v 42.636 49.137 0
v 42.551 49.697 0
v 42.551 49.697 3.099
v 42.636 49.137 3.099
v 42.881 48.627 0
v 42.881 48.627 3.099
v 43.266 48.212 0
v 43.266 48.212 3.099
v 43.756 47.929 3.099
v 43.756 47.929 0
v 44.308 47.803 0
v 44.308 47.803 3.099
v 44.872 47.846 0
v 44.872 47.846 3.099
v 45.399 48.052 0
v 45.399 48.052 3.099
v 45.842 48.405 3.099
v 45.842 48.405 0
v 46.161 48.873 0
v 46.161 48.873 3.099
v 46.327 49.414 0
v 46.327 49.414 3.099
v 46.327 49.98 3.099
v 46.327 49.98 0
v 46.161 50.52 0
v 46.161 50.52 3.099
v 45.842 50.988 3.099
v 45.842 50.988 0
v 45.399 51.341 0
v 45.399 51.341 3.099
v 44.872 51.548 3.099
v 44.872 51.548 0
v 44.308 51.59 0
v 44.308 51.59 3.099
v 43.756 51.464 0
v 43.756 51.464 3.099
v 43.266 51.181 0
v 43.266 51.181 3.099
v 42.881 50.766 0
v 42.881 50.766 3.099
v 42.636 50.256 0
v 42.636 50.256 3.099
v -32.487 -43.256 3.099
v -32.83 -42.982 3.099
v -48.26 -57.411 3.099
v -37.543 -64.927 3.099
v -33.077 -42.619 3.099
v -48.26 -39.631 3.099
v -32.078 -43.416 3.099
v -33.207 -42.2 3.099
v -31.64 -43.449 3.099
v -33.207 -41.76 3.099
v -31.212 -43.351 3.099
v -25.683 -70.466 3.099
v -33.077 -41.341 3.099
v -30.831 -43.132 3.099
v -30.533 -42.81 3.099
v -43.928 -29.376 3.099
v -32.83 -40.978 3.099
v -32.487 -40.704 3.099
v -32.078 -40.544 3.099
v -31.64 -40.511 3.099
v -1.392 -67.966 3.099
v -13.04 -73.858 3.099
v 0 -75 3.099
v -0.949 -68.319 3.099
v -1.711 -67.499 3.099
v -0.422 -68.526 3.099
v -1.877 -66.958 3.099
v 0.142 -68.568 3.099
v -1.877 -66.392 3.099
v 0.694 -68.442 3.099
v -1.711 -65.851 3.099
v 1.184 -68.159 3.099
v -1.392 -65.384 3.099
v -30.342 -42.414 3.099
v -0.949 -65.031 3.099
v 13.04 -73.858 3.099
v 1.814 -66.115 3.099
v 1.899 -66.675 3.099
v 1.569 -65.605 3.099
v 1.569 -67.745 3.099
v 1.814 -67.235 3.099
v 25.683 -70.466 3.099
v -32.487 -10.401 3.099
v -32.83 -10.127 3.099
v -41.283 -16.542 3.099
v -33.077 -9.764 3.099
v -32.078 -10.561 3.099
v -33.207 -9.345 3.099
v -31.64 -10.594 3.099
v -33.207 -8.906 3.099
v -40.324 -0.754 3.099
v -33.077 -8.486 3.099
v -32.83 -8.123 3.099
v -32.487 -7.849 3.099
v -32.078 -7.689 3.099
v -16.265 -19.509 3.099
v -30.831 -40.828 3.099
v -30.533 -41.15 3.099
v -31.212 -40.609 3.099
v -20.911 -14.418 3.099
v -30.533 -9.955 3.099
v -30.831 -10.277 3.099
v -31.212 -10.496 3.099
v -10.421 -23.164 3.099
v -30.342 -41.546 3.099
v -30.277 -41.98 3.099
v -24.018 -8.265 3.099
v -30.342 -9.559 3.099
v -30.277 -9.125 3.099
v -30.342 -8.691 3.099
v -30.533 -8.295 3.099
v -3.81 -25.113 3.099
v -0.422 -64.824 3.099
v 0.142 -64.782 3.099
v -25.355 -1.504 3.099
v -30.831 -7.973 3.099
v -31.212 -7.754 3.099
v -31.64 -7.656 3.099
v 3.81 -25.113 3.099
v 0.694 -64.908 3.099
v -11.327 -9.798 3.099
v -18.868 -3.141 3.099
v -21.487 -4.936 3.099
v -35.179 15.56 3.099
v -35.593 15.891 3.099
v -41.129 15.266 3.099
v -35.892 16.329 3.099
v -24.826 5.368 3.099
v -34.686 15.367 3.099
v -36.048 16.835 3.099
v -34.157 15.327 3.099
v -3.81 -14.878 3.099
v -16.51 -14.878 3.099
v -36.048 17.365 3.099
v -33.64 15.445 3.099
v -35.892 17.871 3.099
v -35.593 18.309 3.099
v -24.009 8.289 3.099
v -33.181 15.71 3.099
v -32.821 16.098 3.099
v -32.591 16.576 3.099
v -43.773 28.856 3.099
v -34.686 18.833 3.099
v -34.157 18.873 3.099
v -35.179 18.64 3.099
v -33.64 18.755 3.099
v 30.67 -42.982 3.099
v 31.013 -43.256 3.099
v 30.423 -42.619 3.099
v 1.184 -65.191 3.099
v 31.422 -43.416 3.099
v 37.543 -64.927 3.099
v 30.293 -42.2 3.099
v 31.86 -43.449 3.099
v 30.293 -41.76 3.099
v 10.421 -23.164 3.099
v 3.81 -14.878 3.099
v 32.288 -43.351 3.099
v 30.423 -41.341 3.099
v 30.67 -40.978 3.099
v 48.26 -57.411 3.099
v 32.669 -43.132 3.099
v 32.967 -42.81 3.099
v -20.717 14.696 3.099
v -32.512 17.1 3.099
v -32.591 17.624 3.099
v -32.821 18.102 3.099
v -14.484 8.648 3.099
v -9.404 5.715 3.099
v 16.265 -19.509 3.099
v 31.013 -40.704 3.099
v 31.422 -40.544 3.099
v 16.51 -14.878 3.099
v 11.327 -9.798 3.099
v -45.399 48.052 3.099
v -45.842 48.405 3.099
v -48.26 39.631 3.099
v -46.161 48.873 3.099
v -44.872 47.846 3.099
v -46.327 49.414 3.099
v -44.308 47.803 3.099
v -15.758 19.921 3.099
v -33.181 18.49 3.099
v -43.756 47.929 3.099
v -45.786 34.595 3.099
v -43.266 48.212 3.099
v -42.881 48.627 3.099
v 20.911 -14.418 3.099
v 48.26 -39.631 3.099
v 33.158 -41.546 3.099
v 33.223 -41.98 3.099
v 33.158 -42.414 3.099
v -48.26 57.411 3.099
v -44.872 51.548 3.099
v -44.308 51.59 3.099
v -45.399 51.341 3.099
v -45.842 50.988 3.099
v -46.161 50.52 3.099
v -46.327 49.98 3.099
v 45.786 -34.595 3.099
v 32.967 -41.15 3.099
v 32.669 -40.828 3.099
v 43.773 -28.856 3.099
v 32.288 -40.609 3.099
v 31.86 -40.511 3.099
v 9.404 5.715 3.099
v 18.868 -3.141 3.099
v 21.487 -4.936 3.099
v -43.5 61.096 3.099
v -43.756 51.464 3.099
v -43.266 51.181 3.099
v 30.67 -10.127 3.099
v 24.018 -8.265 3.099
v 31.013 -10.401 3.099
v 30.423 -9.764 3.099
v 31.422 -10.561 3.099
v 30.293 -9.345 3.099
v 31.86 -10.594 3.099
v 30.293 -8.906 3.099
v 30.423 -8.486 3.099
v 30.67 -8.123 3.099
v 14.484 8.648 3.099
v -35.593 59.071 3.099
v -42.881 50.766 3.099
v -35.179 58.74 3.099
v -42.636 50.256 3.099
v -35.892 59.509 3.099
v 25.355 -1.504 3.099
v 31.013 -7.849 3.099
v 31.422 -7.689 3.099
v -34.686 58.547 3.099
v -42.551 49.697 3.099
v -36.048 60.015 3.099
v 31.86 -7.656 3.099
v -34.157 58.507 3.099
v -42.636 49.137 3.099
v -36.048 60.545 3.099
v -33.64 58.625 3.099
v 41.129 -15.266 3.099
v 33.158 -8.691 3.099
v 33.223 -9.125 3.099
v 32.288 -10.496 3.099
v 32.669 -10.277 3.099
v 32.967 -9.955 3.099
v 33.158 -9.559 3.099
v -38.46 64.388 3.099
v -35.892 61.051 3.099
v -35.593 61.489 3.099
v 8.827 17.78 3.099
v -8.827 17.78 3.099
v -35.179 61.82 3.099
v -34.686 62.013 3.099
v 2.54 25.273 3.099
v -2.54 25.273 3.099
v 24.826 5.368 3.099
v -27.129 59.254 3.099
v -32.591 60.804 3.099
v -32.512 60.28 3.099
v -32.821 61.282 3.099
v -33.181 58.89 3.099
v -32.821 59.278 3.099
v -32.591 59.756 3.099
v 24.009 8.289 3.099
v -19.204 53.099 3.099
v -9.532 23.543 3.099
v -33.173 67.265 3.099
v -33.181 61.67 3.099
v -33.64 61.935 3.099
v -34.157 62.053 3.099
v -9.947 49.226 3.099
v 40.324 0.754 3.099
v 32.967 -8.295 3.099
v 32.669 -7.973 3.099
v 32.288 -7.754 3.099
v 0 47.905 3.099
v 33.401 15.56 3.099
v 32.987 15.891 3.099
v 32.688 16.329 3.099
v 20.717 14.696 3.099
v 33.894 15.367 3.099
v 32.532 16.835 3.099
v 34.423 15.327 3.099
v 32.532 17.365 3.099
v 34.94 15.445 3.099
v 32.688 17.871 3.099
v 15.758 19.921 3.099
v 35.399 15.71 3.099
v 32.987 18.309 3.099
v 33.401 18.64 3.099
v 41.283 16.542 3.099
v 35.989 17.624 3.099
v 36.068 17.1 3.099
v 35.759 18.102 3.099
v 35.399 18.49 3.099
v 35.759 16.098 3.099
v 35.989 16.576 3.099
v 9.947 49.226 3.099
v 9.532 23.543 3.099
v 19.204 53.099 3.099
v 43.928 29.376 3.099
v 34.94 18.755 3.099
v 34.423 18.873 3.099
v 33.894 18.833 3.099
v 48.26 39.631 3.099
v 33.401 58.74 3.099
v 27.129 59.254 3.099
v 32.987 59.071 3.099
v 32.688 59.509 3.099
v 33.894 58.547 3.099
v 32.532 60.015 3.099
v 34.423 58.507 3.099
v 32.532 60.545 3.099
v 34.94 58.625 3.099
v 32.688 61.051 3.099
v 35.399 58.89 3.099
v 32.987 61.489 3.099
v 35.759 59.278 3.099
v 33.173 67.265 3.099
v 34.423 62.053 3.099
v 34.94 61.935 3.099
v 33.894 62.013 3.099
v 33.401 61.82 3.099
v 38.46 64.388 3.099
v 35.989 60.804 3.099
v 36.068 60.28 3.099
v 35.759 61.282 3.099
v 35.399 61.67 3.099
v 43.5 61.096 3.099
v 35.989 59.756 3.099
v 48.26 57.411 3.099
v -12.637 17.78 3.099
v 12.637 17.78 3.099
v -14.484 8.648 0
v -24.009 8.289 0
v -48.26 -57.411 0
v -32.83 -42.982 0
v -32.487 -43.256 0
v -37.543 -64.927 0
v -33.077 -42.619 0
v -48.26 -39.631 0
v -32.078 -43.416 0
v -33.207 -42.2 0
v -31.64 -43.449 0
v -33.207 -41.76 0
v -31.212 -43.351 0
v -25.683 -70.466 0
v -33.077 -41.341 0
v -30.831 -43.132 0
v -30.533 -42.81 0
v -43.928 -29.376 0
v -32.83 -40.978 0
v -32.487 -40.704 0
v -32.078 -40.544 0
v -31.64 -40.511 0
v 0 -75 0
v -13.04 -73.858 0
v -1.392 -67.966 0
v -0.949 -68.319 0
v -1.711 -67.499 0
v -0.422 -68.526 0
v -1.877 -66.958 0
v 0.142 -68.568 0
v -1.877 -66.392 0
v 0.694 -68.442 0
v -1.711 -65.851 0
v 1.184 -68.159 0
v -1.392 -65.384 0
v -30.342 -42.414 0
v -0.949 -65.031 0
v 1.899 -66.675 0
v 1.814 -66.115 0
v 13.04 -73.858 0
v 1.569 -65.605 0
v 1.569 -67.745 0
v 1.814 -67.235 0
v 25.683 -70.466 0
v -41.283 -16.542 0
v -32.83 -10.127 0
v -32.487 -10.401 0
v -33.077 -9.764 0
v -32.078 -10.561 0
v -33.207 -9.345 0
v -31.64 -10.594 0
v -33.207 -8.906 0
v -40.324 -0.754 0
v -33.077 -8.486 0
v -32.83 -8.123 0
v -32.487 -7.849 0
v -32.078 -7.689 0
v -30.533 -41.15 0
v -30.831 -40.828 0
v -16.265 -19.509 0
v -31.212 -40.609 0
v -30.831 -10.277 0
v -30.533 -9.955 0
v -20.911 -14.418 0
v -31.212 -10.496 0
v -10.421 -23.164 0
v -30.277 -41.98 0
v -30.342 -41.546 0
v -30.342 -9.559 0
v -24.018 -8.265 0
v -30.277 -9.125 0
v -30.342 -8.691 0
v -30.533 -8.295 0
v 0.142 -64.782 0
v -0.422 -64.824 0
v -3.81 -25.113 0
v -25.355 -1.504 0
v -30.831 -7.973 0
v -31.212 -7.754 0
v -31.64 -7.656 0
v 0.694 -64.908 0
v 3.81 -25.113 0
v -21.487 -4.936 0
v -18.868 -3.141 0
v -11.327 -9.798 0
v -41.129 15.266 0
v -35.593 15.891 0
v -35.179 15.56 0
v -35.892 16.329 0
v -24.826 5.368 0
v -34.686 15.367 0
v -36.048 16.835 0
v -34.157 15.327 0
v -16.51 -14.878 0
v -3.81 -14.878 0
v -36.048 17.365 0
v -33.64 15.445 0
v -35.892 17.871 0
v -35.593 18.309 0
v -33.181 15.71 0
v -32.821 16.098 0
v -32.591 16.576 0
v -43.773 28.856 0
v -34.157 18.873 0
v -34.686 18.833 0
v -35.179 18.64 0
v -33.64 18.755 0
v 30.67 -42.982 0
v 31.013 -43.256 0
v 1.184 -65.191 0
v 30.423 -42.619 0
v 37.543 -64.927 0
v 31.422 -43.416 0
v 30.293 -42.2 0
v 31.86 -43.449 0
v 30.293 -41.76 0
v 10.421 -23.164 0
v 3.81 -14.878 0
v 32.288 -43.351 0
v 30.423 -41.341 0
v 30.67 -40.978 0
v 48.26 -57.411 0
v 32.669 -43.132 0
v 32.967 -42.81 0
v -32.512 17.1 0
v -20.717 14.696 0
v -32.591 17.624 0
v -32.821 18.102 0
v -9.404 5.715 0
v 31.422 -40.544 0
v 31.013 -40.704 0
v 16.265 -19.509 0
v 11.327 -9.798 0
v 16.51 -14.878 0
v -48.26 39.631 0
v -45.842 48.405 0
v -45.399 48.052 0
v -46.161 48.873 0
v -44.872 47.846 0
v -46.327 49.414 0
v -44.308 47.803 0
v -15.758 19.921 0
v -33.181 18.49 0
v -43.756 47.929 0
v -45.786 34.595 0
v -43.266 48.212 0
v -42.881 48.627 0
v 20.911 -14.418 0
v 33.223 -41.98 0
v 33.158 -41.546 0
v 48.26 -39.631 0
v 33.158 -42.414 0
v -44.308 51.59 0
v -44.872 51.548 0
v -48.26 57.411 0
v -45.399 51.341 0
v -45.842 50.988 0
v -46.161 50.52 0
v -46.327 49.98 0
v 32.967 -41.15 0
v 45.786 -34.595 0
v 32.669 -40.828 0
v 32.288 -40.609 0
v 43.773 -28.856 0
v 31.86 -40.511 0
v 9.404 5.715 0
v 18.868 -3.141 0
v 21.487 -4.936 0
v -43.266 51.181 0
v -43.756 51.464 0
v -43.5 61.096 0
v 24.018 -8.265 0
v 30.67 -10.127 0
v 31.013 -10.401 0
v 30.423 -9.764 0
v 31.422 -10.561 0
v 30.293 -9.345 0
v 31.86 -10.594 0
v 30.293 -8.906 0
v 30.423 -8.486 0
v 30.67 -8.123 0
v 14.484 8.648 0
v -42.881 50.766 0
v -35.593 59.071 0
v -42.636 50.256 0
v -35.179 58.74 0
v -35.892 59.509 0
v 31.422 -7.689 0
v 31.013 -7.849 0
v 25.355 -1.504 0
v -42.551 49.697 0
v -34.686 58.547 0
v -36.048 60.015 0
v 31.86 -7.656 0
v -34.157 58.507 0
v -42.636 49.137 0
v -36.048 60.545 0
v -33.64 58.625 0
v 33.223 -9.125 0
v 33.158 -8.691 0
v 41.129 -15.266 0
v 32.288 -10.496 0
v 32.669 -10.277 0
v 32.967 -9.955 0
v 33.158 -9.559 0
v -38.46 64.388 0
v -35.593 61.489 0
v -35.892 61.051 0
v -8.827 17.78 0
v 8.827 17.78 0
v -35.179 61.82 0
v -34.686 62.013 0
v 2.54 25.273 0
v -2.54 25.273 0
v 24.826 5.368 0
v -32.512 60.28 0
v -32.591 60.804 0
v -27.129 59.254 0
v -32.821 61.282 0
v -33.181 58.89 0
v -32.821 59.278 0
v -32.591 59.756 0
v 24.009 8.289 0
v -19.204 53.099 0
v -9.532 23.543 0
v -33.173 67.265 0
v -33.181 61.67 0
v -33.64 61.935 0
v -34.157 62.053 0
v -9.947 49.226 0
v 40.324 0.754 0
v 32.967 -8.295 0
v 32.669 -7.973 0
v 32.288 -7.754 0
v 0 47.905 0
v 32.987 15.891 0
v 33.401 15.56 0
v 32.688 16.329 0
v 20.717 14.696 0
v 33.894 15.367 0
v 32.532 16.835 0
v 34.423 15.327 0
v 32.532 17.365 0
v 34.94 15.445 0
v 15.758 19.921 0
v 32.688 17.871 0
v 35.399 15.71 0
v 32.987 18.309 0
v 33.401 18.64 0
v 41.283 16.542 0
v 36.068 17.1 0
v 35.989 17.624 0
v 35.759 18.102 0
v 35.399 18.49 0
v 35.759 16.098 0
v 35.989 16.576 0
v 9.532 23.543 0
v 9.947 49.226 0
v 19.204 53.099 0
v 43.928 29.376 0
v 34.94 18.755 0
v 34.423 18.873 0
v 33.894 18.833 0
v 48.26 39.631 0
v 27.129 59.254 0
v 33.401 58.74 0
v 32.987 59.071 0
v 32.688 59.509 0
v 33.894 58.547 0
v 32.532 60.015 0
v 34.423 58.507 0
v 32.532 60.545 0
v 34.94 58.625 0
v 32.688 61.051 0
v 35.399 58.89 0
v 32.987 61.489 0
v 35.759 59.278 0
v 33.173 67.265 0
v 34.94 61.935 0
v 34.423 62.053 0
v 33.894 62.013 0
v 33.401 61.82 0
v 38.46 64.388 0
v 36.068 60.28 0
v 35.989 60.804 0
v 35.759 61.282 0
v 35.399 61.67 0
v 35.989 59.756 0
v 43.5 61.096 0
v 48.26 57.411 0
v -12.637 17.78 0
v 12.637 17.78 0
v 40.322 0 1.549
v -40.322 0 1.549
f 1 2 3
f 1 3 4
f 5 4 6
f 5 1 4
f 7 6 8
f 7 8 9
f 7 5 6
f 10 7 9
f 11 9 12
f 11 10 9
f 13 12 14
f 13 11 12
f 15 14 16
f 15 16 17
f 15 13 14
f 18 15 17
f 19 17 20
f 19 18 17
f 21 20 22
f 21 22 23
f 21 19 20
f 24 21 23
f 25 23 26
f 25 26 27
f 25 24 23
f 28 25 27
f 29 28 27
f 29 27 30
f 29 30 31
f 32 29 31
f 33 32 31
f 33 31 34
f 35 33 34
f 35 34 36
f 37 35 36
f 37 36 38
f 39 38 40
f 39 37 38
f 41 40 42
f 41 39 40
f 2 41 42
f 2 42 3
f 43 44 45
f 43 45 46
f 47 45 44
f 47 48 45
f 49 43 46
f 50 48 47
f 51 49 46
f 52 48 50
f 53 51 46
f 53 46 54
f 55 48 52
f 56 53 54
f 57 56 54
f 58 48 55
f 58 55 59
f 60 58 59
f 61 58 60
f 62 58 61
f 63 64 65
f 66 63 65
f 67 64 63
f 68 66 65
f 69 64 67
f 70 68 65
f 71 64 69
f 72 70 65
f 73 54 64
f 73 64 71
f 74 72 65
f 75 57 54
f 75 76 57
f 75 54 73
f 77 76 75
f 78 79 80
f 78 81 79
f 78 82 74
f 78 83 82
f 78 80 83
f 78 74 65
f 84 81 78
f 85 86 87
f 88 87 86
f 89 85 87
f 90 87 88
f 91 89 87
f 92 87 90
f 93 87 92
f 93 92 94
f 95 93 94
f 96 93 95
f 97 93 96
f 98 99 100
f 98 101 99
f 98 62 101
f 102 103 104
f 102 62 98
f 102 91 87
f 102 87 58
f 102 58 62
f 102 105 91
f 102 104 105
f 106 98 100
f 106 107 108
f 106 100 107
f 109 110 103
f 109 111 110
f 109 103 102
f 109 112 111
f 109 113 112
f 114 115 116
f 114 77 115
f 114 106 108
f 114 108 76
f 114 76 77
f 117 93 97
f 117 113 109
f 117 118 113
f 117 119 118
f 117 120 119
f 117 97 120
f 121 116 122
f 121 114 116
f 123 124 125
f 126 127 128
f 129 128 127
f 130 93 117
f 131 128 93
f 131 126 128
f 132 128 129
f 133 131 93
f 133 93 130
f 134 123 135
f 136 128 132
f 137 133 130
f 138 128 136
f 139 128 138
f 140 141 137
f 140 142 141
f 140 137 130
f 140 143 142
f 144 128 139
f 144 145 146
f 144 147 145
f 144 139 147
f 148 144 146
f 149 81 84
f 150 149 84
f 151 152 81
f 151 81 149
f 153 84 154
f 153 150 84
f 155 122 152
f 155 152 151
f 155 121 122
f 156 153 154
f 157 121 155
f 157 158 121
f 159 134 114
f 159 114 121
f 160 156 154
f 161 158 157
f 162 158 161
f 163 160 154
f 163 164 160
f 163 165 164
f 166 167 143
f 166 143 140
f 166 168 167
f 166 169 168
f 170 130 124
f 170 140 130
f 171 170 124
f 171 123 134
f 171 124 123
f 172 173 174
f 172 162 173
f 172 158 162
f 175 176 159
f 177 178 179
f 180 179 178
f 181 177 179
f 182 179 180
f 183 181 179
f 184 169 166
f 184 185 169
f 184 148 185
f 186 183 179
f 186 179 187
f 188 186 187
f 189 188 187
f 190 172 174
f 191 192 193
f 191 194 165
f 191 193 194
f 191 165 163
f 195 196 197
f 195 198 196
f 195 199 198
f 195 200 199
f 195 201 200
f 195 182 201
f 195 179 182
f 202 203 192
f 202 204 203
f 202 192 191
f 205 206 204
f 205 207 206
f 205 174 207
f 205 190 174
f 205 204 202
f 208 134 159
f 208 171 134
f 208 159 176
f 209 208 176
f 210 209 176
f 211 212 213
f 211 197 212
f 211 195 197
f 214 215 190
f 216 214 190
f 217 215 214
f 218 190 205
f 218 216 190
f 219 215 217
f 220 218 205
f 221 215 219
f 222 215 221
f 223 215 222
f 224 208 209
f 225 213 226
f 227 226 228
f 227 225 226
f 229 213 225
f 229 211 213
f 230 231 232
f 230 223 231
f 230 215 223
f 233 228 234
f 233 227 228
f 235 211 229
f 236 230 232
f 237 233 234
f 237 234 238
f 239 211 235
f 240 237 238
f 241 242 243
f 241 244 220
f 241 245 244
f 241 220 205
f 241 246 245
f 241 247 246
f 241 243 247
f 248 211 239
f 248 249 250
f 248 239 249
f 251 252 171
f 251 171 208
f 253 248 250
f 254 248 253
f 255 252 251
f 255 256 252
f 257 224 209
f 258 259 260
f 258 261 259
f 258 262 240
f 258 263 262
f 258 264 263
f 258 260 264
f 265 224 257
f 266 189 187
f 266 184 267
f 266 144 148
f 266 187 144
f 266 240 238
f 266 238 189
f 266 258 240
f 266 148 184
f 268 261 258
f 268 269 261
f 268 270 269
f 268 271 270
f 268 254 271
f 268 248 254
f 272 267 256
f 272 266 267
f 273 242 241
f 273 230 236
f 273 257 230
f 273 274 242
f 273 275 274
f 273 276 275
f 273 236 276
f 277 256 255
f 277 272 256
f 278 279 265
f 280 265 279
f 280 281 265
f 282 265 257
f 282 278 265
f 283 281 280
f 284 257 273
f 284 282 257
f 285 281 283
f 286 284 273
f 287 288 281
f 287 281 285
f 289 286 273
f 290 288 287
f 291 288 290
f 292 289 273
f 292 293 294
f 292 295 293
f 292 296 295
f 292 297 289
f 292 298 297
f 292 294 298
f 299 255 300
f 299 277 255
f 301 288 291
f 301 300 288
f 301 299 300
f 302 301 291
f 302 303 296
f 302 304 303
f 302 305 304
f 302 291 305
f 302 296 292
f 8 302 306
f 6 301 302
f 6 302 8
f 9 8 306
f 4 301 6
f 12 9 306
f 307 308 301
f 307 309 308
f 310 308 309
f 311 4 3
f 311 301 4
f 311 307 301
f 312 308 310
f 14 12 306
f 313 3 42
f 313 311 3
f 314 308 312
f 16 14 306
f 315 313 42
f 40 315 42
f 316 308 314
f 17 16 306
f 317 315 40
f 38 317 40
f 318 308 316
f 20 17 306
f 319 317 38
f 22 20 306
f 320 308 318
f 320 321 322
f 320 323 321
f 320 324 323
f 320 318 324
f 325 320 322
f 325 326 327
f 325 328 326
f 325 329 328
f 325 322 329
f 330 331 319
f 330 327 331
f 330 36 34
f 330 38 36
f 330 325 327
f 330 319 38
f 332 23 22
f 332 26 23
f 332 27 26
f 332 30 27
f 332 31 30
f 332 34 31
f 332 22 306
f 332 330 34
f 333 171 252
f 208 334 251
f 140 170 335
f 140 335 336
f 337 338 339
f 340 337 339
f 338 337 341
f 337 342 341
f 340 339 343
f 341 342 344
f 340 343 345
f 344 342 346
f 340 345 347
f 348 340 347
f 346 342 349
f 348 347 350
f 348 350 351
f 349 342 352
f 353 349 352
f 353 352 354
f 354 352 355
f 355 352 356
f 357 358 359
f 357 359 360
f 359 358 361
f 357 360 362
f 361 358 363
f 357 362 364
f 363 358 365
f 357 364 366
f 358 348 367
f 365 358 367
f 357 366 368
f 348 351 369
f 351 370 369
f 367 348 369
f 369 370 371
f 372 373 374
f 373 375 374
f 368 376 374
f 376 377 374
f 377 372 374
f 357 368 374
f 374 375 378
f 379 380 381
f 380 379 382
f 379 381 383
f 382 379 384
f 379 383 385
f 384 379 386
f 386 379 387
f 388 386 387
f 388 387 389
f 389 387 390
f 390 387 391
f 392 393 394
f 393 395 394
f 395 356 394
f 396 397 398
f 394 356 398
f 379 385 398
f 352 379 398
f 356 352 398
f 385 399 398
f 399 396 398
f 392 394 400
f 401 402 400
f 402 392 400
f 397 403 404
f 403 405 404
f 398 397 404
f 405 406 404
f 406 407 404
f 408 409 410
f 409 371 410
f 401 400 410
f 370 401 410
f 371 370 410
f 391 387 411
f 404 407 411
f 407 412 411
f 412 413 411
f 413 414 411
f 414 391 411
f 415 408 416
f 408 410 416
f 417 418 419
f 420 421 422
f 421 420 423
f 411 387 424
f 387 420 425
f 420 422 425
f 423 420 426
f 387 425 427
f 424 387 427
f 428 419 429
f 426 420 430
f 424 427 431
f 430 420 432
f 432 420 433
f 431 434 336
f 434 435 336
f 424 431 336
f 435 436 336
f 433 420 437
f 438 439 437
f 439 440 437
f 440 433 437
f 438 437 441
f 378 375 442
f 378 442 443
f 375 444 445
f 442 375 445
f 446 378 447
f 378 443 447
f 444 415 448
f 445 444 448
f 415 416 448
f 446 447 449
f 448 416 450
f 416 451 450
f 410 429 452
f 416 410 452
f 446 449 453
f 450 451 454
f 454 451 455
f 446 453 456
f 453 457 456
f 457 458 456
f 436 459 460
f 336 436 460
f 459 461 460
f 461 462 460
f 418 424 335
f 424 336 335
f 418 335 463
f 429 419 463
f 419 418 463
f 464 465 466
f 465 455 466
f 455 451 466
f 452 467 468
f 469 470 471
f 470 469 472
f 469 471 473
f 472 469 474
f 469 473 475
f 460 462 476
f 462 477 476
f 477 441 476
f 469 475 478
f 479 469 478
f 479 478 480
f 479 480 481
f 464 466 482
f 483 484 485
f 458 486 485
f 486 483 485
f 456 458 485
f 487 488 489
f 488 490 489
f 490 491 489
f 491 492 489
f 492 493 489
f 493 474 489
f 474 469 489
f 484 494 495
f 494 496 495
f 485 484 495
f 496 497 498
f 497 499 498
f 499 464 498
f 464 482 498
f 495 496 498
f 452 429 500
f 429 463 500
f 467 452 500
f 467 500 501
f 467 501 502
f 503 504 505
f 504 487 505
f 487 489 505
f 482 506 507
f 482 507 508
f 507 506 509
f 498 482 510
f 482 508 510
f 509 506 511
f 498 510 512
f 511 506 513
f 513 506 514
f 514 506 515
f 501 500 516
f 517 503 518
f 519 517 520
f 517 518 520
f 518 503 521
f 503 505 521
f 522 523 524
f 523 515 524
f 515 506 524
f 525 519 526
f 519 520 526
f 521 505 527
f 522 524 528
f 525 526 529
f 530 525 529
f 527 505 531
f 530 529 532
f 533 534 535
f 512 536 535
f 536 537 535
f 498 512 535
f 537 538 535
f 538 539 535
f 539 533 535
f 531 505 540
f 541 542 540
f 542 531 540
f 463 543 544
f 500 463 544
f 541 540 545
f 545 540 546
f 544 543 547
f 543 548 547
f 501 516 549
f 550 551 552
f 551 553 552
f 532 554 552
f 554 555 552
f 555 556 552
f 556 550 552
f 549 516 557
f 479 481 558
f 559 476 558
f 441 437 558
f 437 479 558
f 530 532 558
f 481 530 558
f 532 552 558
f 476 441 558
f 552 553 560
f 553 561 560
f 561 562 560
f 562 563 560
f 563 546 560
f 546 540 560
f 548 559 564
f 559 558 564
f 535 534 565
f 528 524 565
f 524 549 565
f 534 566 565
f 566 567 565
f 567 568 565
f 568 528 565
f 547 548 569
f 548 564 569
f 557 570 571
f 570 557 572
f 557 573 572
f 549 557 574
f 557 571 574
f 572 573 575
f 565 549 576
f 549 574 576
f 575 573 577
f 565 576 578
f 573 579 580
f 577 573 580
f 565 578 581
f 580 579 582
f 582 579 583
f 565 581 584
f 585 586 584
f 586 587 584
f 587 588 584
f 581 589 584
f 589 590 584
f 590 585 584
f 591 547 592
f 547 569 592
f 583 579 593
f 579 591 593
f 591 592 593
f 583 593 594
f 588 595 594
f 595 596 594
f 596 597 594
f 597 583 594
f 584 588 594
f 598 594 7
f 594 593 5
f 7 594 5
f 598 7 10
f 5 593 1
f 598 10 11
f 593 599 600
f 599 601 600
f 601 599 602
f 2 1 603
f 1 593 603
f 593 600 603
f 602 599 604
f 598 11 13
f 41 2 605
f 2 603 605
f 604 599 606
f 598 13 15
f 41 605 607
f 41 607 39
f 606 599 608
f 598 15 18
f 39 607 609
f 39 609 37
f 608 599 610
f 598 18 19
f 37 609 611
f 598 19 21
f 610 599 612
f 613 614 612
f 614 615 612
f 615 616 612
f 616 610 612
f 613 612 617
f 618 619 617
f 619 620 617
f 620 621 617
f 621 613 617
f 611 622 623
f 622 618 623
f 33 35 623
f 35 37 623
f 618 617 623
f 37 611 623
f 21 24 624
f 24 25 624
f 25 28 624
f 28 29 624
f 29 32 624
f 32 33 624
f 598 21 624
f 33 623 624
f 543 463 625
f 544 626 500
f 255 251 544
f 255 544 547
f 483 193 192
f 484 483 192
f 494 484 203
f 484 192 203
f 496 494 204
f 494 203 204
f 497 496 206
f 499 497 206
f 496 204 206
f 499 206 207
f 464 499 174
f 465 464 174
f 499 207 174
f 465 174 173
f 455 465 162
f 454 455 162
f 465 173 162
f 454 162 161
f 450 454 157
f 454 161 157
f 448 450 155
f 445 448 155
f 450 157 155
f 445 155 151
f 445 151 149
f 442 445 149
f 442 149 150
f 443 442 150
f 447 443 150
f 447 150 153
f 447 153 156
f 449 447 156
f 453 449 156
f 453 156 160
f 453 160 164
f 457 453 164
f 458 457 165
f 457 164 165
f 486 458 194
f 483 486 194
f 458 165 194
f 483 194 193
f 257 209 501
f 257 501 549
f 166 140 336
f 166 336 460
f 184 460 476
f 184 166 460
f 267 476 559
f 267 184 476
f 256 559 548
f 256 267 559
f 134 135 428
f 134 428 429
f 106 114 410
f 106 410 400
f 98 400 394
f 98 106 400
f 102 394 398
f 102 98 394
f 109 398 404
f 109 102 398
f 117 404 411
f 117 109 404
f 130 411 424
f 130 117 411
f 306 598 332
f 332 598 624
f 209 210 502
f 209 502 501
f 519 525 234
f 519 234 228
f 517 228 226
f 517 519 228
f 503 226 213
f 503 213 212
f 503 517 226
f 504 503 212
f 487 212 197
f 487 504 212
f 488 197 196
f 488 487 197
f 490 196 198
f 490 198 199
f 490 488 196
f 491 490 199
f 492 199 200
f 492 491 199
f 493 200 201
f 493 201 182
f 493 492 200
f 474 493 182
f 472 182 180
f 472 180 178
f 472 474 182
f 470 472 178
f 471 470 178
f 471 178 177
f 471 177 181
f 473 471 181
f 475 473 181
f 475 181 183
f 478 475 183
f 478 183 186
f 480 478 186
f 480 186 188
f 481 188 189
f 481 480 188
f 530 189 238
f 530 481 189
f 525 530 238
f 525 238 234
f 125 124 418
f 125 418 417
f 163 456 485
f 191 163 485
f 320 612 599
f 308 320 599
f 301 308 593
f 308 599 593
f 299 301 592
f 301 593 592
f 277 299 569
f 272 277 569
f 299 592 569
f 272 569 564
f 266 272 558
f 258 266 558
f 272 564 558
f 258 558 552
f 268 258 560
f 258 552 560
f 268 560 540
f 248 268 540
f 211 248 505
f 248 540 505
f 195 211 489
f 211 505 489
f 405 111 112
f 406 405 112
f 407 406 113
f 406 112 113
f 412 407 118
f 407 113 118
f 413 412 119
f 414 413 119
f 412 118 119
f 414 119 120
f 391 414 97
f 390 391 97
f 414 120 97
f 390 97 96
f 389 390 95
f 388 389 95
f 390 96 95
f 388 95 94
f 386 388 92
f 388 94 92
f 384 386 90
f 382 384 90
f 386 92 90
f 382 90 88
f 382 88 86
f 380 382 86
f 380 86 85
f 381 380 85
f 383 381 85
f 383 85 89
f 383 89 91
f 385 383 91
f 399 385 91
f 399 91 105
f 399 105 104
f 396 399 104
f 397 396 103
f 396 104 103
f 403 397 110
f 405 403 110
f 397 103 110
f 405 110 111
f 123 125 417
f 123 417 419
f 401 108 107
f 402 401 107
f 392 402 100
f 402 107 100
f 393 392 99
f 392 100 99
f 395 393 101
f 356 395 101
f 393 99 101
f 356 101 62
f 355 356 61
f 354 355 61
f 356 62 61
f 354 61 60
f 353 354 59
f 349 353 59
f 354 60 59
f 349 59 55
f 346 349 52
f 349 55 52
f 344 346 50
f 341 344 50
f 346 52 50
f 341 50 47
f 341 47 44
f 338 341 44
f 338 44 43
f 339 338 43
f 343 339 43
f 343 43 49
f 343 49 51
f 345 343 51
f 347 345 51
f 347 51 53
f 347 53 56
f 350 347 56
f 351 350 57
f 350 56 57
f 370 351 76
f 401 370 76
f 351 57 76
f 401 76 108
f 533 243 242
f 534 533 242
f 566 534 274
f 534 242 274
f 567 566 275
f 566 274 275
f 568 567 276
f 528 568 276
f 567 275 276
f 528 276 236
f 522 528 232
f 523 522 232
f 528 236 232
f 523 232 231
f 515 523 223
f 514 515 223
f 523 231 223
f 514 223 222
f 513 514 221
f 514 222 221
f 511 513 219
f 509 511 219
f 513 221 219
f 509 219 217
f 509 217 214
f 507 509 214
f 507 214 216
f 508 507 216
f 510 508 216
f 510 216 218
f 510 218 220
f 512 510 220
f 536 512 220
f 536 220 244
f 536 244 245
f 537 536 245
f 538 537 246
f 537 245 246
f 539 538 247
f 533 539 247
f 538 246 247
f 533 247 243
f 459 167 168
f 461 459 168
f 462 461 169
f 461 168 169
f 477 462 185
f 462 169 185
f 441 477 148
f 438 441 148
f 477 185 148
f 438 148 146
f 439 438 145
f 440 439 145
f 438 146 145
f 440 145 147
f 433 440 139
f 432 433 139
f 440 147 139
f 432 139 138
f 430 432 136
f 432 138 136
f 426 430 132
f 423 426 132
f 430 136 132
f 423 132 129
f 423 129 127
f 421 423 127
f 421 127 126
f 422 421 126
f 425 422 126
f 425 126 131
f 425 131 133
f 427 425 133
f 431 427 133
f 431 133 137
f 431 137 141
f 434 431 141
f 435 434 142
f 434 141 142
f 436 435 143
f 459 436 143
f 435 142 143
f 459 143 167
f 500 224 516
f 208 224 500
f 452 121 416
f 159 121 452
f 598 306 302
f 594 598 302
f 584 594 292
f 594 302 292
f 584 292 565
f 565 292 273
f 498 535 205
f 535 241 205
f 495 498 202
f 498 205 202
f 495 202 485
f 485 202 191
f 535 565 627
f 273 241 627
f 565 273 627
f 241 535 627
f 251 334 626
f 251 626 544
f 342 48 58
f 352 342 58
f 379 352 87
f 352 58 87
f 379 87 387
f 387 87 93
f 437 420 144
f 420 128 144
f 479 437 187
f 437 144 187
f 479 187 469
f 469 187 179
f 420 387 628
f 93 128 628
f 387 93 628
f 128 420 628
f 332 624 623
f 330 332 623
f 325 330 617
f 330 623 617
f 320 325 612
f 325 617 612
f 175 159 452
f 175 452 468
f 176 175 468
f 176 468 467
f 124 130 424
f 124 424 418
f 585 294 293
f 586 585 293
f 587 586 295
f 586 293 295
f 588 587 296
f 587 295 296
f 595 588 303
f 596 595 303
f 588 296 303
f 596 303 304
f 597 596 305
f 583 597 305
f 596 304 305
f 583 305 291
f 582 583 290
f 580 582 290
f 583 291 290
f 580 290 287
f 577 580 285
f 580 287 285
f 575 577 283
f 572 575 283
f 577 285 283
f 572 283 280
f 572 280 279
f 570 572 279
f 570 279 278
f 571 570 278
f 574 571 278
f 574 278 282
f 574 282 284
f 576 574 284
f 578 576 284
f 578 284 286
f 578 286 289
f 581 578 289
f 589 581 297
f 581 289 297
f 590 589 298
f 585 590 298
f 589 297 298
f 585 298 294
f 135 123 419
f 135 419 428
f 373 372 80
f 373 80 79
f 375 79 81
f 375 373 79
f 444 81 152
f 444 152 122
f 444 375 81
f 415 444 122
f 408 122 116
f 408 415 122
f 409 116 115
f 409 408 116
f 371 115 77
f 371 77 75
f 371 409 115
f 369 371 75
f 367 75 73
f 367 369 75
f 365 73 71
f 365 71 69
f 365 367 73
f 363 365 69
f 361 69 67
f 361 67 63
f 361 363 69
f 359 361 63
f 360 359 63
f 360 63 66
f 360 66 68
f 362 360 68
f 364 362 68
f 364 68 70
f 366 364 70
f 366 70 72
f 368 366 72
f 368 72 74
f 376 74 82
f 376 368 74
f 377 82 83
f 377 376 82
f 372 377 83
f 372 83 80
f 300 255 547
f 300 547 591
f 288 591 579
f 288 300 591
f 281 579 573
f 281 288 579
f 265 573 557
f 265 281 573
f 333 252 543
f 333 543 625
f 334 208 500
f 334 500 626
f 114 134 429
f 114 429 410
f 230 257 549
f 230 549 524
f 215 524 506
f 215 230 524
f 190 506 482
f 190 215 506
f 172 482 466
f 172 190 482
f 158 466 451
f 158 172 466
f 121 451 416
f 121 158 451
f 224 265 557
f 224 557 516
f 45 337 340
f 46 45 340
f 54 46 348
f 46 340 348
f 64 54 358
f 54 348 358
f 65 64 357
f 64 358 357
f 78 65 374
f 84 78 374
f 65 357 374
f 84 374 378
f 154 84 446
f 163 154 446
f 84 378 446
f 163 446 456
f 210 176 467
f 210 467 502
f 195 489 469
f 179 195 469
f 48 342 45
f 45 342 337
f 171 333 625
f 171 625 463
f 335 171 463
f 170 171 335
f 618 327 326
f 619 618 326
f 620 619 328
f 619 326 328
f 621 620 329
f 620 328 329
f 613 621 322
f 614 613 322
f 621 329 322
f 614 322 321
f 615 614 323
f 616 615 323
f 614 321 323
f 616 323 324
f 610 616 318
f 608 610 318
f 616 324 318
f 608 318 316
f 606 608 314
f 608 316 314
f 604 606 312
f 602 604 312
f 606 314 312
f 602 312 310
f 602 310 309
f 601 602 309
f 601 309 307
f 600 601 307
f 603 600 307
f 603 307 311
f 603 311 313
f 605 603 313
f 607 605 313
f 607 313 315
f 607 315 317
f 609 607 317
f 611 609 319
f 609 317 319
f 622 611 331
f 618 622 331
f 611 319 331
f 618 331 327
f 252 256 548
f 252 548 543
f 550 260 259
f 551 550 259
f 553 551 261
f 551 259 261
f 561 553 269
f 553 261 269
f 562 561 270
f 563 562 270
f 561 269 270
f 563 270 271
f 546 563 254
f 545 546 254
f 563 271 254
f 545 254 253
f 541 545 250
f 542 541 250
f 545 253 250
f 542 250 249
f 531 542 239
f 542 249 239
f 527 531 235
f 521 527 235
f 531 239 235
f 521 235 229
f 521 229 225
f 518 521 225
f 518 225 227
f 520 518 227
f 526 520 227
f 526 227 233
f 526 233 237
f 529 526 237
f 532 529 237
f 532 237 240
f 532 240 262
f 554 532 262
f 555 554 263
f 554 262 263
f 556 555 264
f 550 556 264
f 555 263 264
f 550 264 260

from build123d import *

# Parameters (mm, degrees)
SKETCH1_R           = 1.89865
BOSS_EXTRUDE3_DEPTH = 3.0988
SKETCH2_R           = 1.4732
CUT_EXTRUDE1_DEPTH  = 3.0988
CUT_EXTRUDE2_DEPTH  = 3.0988
SKETCH4_R           = 1.778
CUT_EXTRUDE3_DEPTH  = 3.0988
CUT_EXTRUDE4_DEPTH  = 3.0988


with BuildPart() as part:
    # Sketch1 → Boss-Extrude3 (new body)
    with BuildSketch(Plane.XY):
        with BuildLine():
            Line((-48.26, 57.410560004), (-48.26, -57.410560004))
            ThreePointArc((-48.26, -57.410560004), (0, -75), (48.26, -57.410560004))
            Line((48.26, -57.410560004), (48.26, 57.410560004))
            ThreePointArc((48.26, 57.410560004), (41.013374249, 62.792540423), (33.172661219, 67.264957799))
            ThreePointArc((33.172661219, 67.264957799), (0, 47.904876359), (-33.172661219, 67.264957799))
            ThreePointArc((-33.172661219, 67.264957799), (-41.013374249, 62.792540423), (-48.26, 57.410560004))
        make_face()
        with Locations((0, -66.675)):
            Circle(SKETCH1_R, mode=Mode.SUBTRACT)
        with Locations((-44.45, 49.6966108)):
            Circle(SKETCH1_R, mode=Mode.SUBTRACT)
        with Locations(Location((44.45, 49.6966108, 0), (0, 0, 180))):
            Circle(SKETCH1_R, mode=Mode.SUBTRACT)
    extrude(amount=BOSS_EXTRUDE3_DEPTH)

    # Sketch2 → Cut-Extrude1 (cut)
    with BuildSketch(Plane.XY.offset(3.0988)):
        with Locations((-31.75, -41.98)):
            Circle(SKETCH2_R)
        with Locations((31.75, -41.98)):
            Circle(SKETCH2_R)
        with Locations((-31.75, -9.1251)):
            Circle(SKETCH2_R)
        with Locations((31.75, -9.1251)):
            Circle(SKETCH2_R)
    extrude(amount=-CUT_EXTRUDE1_DEPTH, mode=Mode.SUBTRACT)

    # Sketch3 → Cut-Extrude2 (cut)
    with BuildSketch(Plane.XY.offset(3.0988)):
        with BuildLine():
            Line((8.827105782, 17.78), (2.54, 25.272680903))
            ThreePointArc((2.54, 25.272680903), (15.758317518, 19.920728626), (24.009298775, 8.289365013))
            Line((24.009298775, 8.289365013), (14.484298775, 8.647939367))
            Line((14.484298775, 8.647939367), (9.404298775, 5.715))
            Line((9.404298775, 5.715), (12.637105782, 17.78))
            Line((12.637105782, 17.78), (8.827105782, 17.78))
        make_face()
        with BuildLine():
            Line((18.868143133, -3.140634987), (24.826209076, 5.368365013))
            ThreePointArc((24.826209076, 5.368365013), (20.911260009, -14.418016674), (3.81, -25.112624315))
            Line((3.81, -25.112624315), (3.81, -14.877877919))
            Line((3.81, -14.877877919), (16.51, -14.877877919))
            Line((16.51, -14.877877919), (11.327081569, -9.797877919))
            Line((11.327081569, -9.797877919), (21.487081569, -4.935568543))
            Line((21.487081569, -4.935568543), (18.868143133, -3.140634987))
        make_face()
        with BuildLine():
            Line((-3.81, -14.877877919), (-3.81, -25.112624315))
            ThreePointArc((-3.81, -25.112624315), (-20.911260009, -14.418016674), (-24.826209076, 5.368365013))
            Line((-24.826209076, 5.368365013), (-18.868143133, -3.140634987))
            Line((-18.868143133, -3.140634987), (-21.487081569, -4.935568543))
            Line((-21.487081569, -4.935568543), (-11.327081569, -9.797877919))
            Line((-11.327081569, -9.797877919), (-16.51, -14.877877919))
            Line((-16.51, -14.877877919), (-3.81, -14.877877919))
        make_face()
        with BuildLine():
            Line((-14.484298775, 8.647939367), (-24.009298775, 8.289365013))
            ThreePointArc((-24.009298775, 8.289365013), (-15.758317518, 19.920728626), (-2.54, 25.272680903))
            Line((-2.54, 25.272680903), (-8.827105782, 17.78))
            Line((-8.827105782, 17.78), (-12.637105782, 17.78))
            Line((-12.637105782, 17.78), (-9.404298775, 5.715))
            Line((-9.404298775, 5.715), (-14.484298775, 8.647939367))
        make_face()
    extrude(amount=-CUT_EXTRUDE2_DEPTH, mode=Mode.SUBTRACT)

    # Sketch4 → Cut-Extrude3 (cut)
    with BuildSketch(Plane.XY.offset(3.0988)):
        with Locations((-34.29, 60.279957799)):
            Circle(SKETCH4_R)
        with Locations((34.29, 60.279957799)):
            Circle(SKETCH4_R)
        with Locations((34.29, 17.099957799)):
            Circle(SKETCH4_R)
        with Locations((-34.29, 17.099957799)):
            Circle(SKETCH4_R)
    extrude(amount=-CUT_EXTRUDE3_DEPTH, mode=Mode.SUBTRACT)

    # Sketch5 → Cut-Extrude4 (cut)
    with BuildSketch(Plane.XY.offset(3.0988)):
        with BuildLine():
            Line((48.26, 39.630560004), (48.26, -39.630560004))
            add(Edge.make_bspline(
                [(48.26, -39.630560004), (40.3225, -25.882406719), (40.3225, 0)],
                knots=[0, 0, 0, 1, 1, 1], degree=2))
            add(Edge.make_bspline(
                [(48.26, 39.630560004), (40.3225, 25.882406719), (40.3225, 0)],
                knots=[0, 0, 0, 1, 1, 1], degree=2))
        make_face()
        with BuildLine():
            Line((-48.26, 39.630560004), (-48.26, -39.630560004))
            add(Edge.make_bspline(
                [(-48.26, -39.630560004), (-40.3225, -25.882406719), (-40.3225, 0)],
                knots=[0, 0, 0, 1, 1, 1], degree=2))
            add(Edge.make_bspline(
                [(-48.26, 39.630560004), (-40.3225, 25.882406719), (-40.3225, 0)],
                knots=[0, 0, 0, 1, 1, 1], degree=2))
        make_face()
    extrude(amount=-CUT_EXTRUDE4_DEPTH, mode=Mode.SUBTRACT)


solid = part.part
